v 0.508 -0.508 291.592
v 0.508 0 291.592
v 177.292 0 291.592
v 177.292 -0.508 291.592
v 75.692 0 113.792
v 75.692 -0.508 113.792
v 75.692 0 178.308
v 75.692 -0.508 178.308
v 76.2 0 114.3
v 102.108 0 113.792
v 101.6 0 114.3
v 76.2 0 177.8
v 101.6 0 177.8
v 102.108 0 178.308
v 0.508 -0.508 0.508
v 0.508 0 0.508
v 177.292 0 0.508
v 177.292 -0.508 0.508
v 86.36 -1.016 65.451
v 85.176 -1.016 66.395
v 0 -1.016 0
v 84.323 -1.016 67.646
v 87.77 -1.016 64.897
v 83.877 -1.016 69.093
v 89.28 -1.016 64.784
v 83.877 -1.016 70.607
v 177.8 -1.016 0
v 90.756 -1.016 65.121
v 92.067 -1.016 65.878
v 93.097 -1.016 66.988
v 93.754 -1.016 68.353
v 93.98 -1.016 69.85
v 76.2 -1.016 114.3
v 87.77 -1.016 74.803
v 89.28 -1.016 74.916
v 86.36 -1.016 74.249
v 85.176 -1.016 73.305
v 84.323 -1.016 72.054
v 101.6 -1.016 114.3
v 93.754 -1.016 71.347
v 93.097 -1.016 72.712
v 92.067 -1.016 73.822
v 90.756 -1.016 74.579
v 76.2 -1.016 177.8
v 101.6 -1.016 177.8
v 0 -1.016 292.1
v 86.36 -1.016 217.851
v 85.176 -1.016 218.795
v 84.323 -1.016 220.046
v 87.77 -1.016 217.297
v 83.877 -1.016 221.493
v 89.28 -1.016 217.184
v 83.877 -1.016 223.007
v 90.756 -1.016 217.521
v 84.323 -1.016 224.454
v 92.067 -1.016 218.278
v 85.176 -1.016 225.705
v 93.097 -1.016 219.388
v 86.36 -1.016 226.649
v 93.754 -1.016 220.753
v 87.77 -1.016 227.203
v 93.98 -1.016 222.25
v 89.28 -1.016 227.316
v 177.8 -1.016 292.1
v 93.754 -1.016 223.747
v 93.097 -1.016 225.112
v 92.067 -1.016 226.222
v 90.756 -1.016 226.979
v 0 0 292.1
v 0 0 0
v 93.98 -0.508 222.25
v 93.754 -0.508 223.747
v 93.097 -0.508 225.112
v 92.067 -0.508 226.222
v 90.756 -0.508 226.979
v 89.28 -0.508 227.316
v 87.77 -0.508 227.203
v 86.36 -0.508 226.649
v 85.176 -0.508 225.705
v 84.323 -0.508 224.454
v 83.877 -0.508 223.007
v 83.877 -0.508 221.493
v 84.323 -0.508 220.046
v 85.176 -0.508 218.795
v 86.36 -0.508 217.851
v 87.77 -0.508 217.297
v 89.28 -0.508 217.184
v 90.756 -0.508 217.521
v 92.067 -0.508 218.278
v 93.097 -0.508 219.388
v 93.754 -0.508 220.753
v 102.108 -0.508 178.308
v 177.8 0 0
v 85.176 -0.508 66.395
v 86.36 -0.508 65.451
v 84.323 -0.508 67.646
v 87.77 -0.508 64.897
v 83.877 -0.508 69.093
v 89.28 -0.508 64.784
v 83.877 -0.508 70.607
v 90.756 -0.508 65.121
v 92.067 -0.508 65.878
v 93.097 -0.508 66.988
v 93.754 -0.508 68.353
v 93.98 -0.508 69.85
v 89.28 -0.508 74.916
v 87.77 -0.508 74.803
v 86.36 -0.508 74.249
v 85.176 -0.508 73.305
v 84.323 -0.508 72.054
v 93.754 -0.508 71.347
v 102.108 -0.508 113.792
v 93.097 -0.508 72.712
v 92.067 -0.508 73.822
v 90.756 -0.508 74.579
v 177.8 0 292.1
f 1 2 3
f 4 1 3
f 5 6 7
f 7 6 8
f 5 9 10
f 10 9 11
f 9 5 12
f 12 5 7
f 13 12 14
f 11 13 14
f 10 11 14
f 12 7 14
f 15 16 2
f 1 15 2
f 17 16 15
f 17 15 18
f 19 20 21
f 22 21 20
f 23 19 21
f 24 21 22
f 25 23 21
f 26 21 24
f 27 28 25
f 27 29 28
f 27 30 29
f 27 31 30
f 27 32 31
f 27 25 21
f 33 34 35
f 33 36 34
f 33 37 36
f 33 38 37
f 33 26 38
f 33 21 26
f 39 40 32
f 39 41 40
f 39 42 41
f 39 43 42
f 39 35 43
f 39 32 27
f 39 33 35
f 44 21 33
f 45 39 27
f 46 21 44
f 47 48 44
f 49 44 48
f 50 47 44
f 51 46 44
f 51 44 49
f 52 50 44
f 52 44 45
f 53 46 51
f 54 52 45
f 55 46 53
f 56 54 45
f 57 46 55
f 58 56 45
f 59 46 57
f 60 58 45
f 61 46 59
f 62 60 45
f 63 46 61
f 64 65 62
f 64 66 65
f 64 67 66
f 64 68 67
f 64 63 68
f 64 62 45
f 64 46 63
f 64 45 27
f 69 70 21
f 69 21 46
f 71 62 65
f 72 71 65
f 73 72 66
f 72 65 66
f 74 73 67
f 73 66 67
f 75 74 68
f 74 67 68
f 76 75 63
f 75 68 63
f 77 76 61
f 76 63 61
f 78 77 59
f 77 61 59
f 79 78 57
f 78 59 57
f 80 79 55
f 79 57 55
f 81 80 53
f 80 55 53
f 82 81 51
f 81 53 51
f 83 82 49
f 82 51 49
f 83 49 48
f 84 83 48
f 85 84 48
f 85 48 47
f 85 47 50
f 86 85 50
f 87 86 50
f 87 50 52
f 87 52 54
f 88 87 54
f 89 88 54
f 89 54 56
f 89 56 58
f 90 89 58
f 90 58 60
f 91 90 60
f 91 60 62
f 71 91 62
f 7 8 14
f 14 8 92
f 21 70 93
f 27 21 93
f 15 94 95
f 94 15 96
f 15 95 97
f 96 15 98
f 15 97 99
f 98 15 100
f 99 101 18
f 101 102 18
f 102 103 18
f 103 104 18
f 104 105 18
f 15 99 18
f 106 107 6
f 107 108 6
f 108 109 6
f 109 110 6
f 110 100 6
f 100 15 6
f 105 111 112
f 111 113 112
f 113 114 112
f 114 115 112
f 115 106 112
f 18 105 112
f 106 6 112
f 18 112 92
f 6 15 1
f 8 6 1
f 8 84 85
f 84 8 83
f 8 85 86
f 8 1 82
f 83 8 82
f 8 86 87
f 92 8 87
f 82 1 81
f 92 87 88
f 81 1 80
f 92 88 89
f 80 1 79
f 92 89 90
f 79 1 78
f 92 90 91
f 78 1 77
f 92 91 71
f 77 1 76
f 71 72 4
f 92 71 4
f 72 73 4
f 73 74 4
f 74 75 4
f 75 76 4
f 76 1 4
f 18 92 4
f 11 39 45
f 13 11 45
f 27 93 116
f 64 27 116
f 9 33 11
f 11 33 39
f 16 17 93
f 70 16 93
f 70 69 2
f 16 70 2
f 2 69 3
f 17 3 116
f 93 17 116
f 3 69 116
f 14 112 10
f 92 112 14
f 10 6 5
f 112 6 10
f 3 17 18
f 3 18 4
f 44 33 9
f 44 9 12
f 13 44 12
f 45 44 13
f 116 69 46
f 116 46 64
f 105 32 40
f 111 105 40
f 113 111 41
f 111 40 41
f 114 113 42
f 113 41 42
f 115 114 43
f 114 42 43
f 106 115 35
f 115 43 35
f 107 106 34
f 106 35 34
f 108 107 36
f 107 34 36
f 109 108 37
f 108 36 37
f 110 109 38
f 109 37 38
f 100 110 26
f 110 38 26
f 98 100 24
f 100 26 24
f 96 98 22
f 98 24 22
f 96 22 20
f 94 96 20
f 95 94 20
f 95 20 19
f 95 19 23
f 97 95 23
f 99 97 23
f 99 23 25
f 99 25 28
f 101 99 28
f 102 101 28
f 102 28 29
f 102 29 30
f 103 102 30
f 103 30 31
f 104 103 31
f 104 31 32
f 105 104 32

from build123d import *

# Parameters (mm, degrees)
F0_W     = 177.8
F0_H     = 292.1
F1_DEPTH = 1.016
F3_W     = 25.4
F3_H     = 63.5
F4_DEPTH = 25.4
F5_T     = -0.508
F6_R     = 5.08
F7_DEPTH = 25.4
F8_R     = 5.08
F9_DEPTH = 25.4


with BuildPart() as f1:
    # F0 (on Front) → F1 (new body)
    with BuildSketch(Plane.XZ):
        with Locations((88.9, 146.05)):
            Rectangle(F0_W, F0_H)
    extrude(amount=F1_DEPTH)

    # F3 (on face) → F4 (cut)
    with BuildSketch(Plane.XZ.offset(1.016)):
        with Locations((88.9, 146.05)):
            Rectangle(F3_W, F3_H)
    extrude(amount=-F4_DEPTH, mode=Mode.SUBTRACT)

    # F5
    f5_openings = [f1.faces().sort_by_distance(p)[0] for p in [
        (3.41958, 0, 146.05),
    ]]
    offset(amount=F5_T, openings=f5_openings, kind=Kind.INTERSECTION)

    # F6 (on face) → F7 (cut)
    with BuildSketch(Plane.XZ.offset(1.016)):
        with Locations((88.9, 69.85)):
            Circle(F6_R)
    extrude(amount=-F7_DEPTH, mode=Mode.SUBTRACT)

    # F8 (on face) → F9 (cut)
    with BuildSketch(Plane.XZ.offset(1.016)):
        with Locations((88.9, 222.25)):
            Circle(F8_R)
    extrude(amount=-F9_DEPTH, mode=Mode.SUBTRACT)


solid = f1.part
